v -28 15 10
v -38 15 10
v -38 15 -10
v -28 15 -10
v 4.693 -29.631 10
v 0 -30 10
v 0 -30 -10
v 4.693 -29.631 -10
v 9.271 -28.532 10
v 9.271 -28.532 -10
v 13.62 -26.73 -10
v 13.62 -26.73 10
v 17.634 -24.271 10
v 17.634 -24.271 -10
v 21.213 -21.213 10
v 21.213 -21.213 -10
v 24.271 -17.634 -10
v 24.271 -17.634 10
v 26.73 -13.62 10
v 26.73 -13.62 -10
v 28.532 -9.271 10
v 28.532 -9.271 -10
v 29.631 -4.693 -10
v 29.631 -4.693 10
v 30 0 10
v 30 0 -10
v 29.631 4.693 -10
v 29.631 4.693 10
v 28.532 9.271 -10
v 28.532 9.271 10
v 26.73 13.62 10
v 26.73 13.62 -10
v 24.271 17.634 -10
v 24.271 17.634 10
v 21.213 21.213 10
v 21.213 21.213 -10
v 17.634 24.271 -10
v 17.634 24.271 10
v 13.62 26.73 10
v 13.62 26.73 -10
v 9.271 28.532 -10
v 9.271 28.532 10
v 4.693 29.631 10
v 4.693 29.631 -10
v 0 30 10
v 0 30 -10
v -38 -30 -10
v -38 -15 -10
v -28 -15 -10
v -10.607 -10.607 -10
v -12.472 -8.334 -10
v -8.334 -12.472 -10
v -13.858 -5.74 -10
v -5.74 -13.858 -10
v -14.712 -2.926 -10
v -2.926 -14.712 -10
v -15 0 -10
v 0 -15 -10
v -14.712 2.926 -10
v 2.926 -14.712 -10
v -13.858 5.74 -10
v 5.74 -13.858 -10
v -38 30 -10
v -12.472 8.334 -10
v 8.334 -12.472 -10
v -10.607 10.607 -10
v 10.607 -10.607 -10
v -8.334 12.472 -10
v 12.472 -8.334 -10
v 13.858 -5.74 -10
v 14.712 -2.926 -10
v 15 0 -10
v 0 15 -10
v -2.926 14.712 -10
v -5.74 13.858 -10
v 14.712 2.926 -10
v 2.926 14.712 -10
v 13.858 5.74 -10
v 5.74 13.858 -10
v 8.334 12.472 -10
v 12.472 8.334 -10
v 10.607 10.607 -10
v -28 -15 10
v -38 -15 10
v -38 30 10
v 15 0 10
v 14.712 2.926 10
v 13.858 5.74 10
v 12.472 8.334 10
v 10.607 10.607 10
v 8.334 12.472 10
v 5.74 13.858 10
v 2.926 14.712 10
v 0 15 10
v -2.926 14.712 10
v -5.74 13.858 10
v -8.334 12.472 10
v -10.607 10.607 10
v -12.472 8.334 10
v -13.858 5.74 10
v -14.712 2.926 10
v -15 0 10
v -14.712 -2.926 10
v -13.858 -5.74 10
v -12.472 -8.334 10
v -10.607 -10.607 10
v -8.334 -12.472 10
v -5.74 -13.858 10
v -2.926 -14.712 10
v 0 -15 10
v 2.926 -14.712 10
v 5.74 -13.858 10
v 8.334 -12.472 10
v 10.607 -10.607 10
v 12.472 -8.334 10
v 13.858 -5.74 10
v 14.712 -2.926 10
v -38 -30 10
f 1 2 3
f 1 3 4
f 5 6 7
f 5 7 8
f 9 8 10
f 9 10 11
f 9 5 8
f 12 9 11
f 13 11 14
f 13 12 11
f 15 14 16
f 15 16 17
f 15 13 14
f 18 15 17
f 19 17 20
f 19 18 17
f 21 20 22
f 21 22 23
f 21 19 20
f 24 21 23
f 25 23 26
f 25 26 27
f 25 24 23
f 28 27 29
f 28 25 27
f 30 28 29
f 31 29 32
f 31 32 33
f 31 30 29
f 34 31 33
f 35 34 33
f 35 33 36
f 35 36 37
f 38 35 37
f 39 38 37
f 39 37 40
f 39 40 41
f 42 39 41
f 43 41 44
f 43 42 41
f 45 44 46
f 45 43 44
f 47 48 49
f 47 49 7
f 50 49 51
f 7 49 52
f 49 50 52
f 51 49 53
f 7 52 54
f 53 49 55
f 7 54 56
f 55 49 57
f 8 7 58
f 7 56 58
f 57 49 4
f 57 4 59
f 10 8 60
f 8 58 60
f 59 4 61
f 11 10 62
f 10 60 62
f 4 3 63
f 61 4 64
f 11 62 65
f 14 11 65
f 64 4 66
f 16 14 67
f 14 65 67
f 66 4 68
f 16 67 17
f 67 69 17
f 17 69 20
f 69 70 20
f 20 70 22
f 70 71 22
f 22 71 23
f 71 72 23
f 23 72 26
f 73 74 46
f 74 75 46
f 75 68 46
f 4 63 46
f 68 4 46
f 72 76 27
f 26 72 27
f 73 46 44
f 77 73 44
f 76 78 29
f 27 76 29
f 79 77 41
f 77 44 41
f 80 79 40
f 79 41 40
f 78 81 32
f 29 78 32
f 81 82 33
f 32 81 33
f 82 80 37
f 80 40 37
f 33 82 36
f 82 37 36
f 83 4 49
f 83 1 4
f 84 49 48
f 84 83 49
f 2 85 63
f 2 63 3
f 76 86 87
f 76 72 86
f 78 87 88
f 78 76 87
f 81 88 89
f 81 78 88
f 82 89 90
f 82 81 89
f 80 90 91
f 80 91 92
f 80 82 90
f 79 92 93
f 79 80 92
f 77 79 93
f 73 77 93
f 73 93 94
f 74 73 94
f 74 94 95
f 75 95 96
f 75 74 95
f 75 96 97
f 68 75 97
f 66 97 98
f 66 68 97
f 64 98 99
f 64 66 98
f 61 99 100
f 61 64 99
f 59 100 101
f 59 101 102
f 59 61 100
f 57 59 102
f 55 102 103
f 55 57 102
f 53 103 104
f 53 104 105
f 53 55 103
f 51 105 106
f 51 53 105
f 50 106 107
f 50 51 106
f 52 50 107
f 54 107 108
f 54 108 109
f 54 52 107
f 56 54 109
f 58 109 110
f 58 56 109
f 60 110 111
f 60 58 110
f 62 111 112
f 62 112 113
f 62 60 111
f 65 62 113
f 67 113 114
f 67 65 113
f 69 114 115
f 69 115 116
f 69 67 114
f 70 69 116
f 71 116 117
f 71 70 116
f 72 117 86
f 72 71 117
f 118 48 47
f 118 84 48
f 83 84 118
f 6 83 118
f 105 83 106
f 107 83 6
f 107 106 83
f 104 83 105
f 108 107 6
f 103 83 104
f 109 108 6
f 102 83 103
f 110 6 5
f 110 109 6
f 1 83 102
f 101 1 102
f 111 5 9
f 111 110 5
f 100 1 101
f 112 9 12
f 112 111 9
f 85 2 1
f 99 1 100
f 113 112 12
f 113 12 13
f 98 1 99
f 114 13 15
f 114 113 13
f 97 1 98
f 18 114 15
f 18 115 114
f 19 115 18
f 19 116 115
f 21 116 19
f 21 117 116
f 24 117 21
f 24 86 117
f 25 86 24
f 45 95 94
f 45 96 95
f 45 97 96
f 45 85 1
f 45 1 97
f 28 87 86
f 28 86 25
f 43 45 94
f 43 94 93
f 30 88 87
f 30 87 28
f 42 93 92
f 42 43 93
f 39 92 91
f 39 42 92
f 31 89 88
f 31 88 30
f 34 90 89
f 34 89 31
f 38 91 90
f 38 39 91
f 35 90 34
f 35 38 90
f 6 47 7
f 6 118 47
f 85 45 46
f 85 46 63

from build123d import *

# Parameters (mm, degrees)
F0_R     = 15
F1_DEPTH = 10


with BuildPart() as f1:
    # F0 (on Top) → F1 (new body, symmetric)
    with BuildSketch(Plane.XY):
        with BuildLine():
            Line((-38, -30), (0, -30))
            ThreePointArc((0, -30), (30, 0), (0, 30))
            Line((0, 30), (-38, 30))
            Line((-38, 30), (-38, 15))
            Line((-38, 15), (-28, 15))
            Line((-28, 15), (-28, -15))
            Line((-28, -15), (-38, -15))
            Line((-38, -15), (-38, -30))
        make_face()
        Circle(F0_R, mode=Mode.SUBTRACT)
    extrude(amount=F1_DEPTH, both=True)


solid = f1.part
